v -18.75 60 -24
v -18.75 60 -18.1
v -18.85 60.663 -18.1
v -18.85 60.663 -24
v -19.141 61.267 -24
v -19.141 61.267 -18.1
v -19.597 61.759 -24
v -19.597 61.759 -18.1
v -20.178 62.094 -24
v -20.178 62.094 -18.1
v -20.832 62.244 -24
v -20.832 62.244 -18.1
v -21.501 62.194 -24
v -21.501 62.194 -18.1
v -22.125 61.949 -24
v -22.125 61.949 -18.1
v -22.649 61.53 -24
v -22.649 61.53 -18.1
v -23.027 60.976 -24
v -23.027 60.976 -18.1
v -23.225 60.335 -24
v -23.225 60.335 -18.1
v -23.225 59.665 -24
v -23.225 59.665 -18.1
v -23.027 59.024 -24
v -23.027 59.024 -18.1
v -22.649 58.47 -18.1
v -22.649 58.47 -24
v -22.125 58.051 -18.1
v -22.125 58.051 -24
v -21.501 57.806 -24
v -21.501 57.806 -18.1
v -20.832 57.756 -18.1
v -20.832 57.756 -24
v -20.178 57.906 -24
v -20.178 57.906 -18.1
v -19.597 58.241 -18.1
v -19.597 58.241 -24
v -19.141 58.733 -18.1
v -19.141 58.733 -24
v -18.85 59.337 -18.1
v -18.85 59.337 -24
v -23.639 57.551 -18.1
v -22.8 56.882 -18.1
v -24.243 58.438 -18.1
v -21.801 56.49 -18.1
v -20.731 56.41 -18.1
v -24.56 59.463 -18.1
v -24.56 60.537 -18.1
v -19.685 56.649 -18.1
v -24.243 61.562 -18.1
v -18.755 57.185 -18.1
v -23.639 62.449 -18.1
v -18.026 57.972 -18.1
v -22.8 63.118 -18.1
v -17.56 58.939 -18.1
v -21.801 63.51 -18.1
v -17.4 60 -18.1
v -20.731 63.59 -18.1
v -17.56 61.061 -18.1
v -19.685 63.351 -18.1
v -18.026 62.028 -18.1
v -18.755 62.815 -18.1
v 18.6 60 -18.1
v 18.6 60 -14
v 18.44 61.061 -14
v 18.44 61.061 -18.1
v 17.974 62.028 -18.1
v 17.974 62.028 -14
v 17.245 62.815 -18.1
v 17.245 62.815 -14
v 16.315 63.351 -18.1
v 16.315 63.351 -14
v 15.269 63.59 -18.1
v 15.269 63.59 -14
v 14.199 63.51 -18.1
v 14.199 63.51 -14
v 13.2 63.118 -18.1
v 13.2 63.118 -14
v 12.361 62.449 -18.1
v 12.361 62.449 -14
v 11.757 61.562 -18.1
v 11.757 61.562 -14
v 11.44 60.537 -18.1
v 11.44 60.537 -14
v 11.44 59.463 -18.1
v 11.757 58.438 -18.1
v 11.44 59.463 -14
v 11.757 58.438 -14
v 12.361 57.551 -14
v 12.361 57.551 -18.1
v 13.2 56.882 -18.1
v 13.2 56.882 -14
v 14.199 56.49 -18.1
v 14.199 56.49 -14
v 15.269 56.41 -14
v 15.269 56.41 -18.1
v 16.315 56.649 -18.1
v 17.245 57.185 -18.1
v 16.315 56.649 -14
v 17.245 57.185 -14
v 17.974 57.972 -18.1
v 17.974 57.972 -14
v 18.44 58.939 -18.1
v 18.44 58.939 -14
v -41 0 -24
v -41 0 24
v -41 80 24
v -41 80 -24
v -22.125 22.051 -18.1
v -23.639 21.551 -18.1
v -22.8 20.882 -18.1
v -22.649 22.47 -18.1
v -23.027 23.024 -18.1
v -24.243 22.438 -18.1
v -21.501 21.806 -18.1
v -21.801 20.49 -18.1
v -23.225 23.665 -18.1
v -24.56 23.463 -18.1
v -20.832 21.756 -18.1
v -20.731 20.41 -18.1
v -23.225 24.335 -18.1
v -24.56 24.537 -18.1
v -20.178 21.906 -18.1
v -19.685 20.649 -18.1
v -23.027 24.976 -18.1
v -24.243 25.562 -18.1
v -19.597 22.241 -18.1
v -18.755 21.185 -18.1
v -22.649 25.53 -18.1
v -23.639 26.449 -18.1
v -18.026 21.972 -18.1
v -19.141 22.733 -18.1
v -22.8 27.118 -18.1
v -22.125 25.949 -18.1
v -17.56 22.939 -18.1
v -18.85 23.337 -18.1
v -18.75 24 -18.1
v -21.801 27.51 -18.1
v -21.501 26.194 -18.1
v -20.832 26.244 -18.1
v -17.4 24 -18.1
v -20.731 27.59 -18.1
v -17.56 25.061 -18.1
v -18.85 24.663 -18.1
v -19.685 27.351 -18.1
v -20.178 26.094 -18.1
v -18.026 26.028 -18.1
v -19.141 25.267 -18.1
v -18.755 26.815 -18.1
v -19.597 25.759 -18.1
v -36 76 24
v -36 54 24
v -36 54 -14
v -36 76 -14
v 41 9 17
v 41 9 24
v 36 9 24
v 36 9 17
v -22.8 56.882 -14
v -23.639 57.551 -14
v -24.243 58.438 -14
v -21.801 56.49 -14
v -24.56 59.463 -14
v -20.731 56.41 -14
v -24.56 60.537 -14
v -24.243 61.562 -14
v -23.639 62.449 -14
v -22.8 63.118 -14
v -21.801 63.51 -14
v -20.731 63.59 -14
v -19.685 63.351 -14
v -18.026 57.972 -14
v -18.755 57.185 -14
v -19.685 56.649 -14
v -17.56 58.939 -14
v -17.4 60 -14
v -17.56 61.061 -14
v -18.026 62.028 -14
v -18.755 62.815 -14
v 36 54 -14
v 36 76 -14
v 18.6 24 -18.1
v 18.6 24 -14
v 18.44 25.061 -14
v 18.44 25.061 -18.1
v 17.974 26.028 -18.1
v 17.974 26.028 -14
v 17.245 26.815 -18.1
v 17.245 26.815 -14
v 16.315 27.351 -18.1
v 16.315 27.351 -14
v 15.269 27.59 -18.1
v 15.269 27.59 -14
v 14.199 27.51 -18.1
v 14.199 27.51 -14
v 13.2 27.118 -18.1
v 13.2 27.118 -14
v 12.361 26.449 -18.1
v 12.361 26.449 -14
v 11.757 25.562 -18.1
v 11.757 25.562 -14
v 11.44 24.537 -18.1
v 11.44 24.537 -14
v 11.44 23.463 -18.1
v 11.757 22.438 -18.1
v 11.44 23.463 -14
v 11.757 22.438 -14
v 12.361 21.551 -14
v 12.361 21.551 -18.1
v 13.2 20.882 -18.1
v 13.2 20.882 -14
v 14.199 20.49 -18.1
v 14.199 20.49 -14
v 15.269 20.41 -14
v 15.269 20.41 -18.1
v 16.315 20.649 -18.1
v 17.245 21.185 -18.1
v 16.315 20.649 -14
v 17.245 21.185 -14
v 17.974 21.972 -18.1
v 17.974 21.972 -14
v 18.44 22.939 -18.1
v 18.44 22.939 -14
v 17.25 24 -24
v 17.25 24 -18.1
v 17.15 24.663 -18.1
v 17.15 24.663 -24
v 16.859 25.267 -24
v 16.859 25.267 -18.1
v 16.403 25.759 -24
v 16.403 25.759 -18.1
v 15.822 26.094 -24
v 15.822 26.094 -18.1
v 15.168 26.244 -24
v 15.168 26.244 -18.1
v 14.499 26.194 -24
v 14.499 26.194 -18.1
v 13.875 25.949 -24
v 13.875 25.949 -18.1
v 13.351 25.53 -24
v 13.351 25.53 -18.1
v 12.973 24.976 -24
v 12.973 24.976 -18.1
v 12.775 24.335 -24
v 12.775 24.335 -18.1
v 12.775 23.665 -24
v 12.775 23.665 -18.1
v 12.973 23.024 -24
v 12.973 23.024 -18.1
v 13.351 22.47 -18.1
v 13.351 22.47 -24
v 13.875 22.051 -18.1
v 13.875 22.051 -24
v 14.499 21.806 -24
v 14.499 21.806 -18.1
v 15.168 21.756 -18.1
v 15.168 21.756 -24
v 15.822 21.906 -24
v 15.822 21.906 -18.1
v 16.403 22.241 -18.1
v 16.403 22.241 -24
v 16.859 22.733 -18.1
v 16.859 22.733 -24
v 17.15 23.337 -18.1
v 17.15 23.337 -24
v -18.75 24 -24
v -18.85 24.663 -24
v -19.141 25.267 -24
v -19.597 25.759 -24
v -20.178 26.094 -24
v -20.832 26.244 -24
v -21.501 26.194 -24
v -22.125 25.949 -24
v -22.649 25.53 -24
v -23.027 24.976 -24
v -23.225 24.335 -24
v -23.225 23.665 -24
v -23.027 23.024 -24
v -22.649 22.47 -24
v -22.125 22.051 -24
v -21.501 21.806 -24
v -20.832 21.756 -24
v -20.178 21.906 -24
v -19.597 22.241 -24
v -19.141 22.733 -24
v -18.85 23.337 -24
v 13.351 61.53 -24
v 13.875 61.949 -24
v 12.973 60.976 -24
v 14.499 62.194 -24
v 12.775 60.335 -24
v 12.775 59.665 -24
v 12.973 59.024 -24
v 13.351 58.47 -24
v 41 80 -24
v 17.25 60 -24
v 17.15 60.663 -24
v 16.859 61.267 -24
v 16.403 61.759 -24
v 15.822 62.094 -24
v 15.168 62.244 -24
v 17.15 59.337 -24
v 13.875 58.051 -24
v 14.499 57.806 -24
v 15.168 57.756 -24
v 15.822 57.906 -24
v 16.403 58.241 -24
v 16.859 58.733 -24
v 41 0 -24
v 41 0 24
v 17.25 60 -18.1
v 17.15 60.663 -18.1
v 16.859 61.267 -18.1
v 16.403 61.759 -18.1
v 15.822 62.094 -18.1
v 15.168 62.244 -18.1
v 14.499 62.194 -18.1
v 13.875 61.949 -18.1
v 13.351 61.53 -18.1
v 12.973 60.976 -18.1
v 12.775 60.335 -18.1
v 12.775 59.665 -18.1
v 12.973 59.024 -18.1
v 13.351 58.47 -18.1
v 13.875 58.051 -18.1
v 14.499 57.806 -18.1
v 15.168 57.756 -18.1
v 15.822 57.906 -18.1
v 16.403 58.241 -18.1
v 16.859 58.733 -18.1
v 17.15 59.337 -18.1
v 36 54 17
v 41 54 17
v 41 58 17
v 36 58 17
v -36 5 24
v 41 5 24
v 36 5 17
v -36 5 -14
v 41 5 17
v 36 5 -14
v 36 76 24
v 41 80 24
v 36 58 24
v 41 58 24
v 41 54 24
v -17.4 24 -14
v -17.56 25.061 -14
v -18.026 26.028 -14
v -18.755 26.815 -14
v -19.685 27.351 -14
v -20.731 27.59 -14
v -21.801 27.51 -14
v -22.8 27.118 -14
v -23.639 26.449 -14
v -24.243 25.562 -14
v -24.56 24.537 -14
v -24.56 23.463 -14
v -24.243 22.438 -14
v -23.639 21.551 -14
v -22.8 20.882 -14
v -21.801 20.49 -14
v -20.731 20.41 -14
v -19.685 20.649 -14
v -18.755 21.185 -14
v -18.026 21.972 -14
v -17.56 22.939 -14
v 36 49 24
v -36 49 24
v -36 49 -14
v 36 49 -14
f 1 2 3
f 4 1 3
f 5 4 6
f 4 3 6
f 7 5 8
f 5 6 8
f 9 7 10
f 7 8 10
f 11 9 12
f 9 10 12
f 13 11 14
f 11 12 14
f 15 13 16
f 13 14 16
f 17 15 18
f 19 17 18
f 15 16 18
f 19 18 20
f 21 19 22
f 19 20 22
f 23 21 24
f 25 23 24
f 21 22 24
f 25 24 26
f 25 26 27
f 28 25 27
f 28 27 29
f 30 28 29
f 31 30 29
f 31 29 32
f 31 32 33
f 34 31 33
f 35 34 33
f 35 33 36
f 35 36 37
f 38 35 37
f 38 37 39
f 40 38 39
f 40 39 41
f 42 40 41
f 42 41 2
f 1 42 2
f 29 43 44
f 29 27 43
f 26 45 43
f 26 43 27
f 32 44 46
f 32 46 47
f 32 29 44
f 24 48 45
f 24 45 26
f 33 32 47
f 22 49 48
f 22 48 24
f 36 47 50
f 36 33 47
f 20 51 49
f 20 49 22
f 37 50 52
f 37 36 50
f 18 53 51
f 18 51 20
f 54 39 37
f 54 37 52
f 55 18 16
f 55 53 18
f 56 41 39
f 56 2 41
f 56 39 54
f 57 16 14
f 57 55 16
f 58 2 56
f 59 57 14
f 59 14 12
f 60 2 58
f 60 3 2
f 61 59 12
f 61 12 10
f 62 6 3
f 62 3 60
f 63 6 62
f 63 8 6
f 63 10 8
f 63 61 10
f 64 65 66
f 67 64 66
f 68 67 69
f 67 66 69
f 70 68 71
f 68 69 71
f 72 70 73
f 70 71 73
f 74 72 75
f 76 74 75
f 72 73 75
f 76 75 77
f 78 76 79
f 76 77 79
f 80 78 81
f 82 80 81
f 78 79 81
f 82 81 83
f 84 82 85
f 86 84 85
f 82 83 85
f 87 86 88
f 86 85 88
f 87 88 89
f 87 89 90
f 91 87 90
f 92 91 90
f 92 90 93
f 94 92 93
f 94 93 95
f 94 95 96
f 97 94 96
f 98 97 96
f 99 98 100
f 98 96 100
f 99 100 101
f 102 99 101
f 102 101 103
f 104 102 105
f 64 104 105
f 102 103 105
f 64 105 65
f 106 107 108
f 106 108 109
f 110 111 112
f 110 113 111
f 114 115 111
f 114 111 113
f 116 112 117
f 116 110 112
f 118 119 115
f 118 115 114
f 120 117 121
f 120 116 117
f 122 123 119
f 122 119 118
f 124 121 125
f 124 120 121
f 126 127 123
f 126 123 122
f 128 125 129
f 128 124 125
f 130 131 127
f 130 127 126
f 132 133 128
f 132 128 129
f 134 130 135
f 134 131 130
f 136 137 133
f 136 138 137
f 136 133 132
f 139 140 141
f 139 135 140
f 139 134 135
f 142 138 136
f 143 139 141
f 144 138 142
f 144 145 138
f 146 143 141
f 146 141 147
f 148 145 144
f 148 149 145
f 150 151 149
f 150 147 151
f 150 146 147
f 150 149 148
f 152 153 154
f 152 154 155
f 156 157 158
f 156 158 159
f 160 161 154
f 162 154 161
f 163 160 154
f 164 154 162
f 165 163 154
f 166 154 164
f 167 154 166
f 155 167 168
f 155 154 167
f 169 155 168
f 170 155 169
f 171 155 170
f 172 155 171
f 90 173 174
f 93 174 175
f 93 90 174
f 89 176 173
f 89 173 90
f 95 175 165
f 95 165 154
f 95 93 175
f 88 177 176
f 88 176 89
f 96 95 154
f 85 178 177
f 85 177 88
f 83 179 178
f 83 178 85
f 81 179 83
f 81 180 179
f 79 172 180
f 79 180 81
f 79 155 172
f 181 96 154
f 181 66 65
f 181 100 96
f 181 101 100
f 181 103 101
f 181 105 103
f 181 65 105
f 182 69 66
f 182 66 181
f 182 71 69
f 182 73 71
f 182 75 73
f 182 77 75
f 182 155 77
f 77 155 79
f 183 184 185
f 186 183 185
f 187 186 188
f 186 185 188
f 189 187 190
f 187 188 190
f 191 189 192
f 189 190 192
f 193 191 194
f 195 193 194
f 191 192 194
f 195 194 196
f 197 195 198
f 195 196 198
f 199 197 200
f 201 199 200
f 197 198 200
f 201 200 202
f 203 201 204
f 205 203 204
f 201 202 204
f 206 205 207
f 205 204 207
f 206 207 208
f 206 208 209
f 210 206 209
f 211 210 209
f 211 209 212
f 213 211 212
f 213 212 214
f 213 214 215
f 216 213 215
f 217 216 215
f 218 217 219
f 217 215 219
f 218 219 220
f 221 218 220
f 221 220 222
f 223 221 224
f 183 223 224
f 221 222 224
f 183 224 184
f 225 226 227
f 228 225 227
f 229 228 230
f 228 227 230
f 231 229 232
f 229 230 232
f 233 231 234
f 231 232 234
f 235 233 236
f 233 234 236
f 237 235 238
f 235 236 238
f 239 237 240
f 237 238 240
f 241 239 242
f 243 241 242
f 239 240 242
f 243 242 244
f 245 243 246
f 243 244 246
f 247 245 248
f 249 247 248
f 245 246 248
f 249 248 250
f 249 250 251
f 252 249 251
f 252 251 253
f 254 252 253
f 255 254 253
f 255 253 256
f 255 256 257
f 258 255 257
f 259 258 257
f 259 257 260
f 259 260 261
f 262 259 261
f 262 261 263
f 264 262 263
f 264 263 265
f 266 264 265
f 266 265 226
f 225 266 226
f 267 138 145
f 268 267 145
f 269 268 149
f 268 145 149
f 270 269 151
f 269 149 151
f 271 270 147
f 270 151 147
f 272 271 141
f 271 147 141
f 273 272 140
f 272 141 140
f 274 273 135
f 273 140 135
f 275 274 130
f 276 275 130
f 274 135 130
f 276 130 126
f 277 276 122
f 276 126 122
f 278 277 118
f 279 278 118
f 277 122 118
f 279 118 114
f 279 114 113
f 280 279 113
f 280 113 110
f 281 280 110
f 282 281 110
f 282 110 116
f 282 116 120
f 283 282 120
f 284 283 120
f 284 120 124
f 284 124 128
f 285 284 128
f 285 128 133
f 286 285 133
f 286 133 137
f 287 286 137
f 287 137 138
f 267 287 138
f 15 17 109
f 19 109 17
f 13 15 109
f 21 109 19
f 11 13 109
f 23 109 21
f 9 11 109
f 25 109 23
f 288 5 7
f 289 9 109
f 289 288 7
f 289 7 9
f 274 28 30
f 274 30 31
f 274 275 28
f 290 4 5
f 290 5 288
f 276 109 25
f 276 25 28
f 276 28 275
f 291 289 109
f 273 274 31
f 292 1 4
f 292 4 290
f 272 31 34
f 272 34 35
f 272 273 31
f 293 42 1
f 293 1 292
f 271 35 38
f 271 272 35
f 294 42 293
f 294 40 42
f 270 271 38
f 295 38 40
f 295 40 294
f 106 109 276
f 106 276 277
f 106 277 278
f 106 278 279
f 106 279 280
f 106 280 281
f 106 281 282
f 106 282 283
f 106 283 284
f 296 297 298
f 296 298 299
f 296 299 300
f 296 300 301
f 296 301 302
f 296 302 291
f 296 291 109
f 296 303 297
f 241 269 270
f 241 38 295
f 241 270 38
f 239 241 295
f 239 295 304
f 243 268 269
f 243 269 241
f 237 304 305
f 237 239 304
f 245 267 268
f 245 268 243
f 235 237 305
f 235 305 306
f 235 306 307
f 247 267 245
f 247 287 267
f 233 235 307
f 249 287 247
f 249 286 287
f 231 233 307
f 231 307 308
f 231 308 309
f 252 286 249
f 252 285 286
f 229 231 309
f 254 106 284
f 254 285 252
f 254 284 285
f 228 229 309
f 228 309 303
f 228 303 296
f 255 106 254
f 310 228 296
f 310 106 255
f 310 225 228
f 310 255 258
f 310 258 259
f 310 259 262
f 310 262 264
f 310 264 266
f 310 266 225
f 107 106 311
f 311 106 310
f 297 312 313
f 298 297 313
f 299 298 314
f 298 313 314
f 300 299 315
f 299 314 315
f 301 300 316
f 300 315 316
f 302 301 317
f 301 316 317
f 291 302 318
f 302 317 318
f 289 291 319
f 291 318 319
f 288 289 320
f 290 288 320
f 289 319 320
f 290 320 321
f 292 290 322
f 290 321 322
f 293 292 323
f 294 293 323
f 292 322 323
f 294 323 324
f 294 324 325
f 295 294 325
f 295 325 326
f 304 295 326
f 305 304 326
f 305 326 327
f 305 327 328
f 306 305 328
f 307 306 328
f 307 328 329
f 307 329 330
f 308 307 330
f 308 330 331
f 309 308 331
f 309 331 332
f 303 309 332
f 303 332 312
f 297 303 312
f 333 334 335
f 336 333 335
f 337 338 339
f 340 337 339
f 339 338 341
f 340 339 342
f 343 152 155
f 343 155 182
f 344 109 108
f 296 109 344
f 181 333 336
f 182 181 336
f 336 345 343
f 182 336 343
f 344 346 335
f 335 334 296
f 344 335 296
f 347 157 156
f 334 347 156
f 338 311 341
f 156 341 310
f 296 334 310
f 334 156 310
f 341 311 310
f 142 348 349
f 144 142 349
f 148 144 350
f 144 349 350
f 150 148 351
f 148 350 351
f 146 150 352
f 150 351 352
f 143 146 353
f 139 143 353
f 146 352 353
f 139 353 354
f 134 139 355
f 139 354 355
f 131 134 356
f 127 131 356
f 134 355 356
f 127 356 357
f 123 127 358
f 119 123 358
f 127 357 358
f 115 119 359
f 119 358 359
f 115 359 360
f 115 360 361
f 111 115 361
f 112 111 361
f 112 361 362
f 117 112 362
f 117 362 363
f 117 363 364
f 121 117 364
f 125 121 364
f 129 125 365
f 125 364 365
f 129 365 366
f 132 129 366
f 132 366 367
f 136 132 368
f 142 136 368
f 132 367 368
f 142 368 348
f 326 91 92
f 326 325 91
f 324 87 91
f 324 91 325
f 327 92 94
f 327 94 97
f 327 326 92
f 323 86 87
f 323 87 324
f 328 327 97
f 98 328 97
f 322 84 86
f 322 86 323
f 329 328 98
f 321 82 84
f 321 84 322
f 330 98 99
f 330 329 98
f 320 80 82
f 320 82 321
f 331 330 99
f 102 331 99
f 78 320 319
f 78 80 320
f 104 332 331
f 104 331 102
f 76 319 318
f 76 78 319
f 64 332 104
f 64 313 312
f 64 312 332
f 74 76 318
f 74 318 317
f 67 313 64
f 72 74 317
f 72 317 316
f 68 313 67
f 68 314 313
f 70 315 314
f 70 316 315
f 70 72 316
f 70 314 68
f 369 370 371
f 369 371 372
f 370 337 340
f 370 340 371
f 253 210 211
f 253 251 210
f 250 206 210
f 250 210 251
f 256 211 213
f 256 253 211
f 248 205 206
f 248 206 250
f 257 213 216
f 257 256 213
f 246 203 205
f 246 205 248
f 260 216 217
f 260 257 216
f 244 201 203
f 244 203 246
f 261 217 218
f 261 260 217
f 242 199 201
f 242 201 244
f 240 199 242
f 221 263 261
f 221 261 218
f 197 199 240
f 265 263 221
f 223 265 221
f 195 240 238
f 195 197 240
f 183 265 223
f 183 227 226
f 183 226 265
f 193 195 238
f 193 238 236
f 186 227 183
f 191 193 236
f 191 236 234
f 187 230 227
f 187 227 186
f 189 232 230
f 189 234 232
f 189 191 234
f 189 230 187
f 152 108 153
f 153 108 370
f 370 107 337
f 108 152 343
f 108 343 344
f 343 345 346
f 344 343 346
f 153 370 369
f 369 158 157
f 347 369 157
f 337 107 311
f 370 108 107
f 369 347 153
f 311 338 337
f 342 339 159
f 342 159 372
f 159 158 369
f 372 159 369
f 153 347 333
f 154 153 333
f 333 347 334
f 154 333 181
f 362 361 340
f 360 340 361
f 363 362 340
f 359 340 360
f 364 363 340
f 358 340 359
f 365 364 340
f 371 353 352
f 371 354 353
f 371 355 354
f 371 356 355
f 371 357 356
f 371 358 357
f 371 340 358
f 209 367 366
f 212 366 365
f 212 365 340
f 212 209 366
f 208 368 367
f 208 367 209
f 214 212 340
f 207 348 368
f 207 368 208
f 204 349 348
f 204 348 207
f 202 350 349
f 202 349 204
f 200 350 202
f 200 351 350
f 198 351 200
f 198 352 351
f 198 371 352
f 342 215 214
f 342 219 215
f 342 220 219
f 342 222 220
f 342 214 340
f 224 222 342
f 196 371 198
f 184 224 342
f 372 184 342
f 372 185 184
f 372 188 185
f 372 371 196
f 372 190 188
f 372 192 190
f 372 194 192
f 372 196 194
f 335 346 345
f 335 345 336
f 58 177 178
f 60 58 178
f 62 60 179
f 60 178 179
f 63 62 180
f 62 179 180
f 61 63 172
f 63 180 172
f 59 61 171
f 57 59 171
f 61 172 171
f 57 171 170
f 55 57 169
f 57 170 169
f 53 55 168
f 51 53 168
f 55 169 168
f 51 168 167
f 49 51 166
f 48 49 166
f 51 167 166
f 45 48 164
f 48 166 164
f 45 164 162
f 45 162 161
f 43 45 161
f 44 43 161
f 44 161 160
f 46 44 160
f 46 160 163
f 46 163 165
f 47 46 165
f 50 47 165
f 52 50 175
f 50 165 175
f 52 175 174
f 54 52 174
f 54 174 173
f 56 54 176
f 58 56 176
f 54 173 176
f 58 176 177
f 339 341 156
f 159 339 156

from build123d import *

# Parameters (mm, degrees)
SKETCH_1_W          = 82
SKETCH_1_H          = 48
EXTRUDE_1_DEPTH     = 80
SKETCH_2_W          = 72
SKETCH_2_H          = 44
SKETCH_2_H_2        = 22
CUT_EXTRUDE_1_DEPTH = 38
CUT_EXTRUDE_2_REACH = 84
SKETCH_3_W          = 7
SKETCH_3_H          = 4
SKETCH_5_R          = 3.6
CUT_EXTRUDE_3_DEPTH = 4.1
CUT_EXTRUDE_4_REACH = 12
SKETCH_6_R          = 2.25


with BuildPart() as part:
    # 草圖1 → 填料-伸長1 (new body)
    with BuildSketch(Plane(origin=(0, 0, 0), x_dir=(1, 0, 0), z_dir=(0, 1, 0))):
        Rectangle(SKETCH_1_W, SKETCH_1_H)
    extrude(amount=EXTRUDE_1_DEPTH)

    # 草圖2 → 除料-伸長1 (cut)
    with BuildSketch(Plane.XY.offset(24)):
        with Locations((0, 27)):
            Rectangle(SKETCH_2_W, SKETCH_2_H)
        with Locations((0, 65)):
            Rectangle(SKETCH_2_W, SKETCH_2_H_2)
    extrude(amount=-CUT_EXTRUDE_1_DEPTH, mode=Mode.SUBTRACT)

    # 草圖3 → 除料-伸長2 (cut, up to next)
    with BuildSketch(Plane(origin=(41, 0, 0), x_dir=(0, 0, -1), z_dir=(1, 0, 0)), mode=Mode.PRIVATE) as cut_extrude_2_sk1:
        with Locations((-20.5, 7)):
            Rectangle(SKETCH_3_W, SKETCH_3_H)
    cut_extrude_2_tool1 = extrude(cut_extrude_2_sk1.sketch, amount=-CUT_EXTRUDE_2_REACH, mode=Mode.PRIVATE) & part.part
    add(cut_extrude_2_tool1.solids().sort_by_distance((41, 7, 20.5))[0], mode=Mode.SUBTRACT)
    # 草圖3 → 除料-伸長2 (cut, up to next)
    with BuildSketch(Plane(origin=(41, 0, 0), x_dir=(0, 0, -1), z_dir=(1, 0, 0)), mode=Mode.PRIVATE) as cut_extrude_2_sk2:
        with Locations((-20.5, 56)):
            Rectangle(SKETCH_3_W, SKETCH_3_H)
    cut_extrude_2_tool2 = extrude(cut_extrude_2_sk2.sketch, amount=-CUT_EXTRUDE_2_REACH, mode=Mode.PRIVATE) & part.part
    add(cut_extrude_2_tool2.solids().sort_by_distance((41, 56, 20.5))[0], mode=Mode.SUBTRACT)

    # 草圖5 → 除料-伸長3 (cut)
    with BuildSketch(Plane.XY.offset(-14)):
        with Locations((-21, 60)):
            Circle(SKETCH_5_R)
        with Locations((15, 60)):
            Circle(SKETCH_5_R)
        with Locations((15, 24)):
            Circle(SKETCH_5_R)
        with Locations((-21, 24)):
            Circle(SKETCH_5_R)
    extrude(amount=-CUT_EXTRUDE_3_DEPTH, mode=Mode.SUBTRACT)

    # 草圖6 → 除料-伸長4 (cut, up to next)
    with BuildSketch(Plane.XY.offset(-14), mode=Mode.PRIVATE) as cut_extrude_4_sk1:
        with Locations((-21, 60)):
            Circle(SKETCH_6_R)
    cut_extrude_4_tool1 = extrude(cut_extrude_4_sk1.sketch, amount=-CUT_EXTRUDE_4_REACH, mode=Mode.PRIVATE) & part.part
    add(cut_extrude_4_tool1.solids().sort_by_distance((-21, 60, -14))[0], mode=Mode.SUBTRACT)
    # 草圖6 → 除料-伸長4 (cut, up to next)
    with BuildSketch(Plane.XY.offset(-14), mode=Mode.PRIVATE) as cut_extrude_4_sk2:
        with Locations((15, 60)):
            Circle(SKETCH_6_R)
    cut_extrude_4_tool2 = extrude(cut_extrude_4_sk2.sketch, amount=-CUT_EXTRUDE_4_REACH, mode=Mode.PRIVATE) & part.part
    add(cut_extrude_4_tool2.solids().sort_by_distance((15, 60, -14))[0], mode=Mode.SUBTRACT)
    # 草圖6 → 除料-伸長4 (cut, up to next)
    with BuildSketch(Plane.XY.offset(-14), mode=Mode.PRIVATE) as cut_extrude_4_sk3:
        with Locations((15, 24)):
            Circle(SKETCH_6_R)
    cut_extrude_4_tool3 = extrude(cut_extrude_4_sk3.sketch, amount=-CUT_EXTRUDE_4_REACH, mode=Mode.PRIVATE) & part.part
    add(cut_extrude_4_tool3.solids().sort_by_distance((15, 24, -14))[0], mode=Mode.SUBTRACT)
    # 草圖6 → 除料-伸長4 (cut, up to next)
    with BuildSketch(Plane.XY.offset(-14), mode=Mode.PRIVATE) as cut_extrude_4_sk4:
        with Locations((-21, 24)):
            Circle(SKETCH_6_R)
    cut_extrude_4_tool4 = extrude(cut_extrude_4_sk4.sketch, amount=-CUT_EXTRUDE_4_REACH, mode=Mode.PRIVATE) & part.part
    add(cut_extrude_4_tool4.solids().sort_by_distance((-21, 24, -14))[0], mode=Mode.SUBTRACT)


solid = part.part
